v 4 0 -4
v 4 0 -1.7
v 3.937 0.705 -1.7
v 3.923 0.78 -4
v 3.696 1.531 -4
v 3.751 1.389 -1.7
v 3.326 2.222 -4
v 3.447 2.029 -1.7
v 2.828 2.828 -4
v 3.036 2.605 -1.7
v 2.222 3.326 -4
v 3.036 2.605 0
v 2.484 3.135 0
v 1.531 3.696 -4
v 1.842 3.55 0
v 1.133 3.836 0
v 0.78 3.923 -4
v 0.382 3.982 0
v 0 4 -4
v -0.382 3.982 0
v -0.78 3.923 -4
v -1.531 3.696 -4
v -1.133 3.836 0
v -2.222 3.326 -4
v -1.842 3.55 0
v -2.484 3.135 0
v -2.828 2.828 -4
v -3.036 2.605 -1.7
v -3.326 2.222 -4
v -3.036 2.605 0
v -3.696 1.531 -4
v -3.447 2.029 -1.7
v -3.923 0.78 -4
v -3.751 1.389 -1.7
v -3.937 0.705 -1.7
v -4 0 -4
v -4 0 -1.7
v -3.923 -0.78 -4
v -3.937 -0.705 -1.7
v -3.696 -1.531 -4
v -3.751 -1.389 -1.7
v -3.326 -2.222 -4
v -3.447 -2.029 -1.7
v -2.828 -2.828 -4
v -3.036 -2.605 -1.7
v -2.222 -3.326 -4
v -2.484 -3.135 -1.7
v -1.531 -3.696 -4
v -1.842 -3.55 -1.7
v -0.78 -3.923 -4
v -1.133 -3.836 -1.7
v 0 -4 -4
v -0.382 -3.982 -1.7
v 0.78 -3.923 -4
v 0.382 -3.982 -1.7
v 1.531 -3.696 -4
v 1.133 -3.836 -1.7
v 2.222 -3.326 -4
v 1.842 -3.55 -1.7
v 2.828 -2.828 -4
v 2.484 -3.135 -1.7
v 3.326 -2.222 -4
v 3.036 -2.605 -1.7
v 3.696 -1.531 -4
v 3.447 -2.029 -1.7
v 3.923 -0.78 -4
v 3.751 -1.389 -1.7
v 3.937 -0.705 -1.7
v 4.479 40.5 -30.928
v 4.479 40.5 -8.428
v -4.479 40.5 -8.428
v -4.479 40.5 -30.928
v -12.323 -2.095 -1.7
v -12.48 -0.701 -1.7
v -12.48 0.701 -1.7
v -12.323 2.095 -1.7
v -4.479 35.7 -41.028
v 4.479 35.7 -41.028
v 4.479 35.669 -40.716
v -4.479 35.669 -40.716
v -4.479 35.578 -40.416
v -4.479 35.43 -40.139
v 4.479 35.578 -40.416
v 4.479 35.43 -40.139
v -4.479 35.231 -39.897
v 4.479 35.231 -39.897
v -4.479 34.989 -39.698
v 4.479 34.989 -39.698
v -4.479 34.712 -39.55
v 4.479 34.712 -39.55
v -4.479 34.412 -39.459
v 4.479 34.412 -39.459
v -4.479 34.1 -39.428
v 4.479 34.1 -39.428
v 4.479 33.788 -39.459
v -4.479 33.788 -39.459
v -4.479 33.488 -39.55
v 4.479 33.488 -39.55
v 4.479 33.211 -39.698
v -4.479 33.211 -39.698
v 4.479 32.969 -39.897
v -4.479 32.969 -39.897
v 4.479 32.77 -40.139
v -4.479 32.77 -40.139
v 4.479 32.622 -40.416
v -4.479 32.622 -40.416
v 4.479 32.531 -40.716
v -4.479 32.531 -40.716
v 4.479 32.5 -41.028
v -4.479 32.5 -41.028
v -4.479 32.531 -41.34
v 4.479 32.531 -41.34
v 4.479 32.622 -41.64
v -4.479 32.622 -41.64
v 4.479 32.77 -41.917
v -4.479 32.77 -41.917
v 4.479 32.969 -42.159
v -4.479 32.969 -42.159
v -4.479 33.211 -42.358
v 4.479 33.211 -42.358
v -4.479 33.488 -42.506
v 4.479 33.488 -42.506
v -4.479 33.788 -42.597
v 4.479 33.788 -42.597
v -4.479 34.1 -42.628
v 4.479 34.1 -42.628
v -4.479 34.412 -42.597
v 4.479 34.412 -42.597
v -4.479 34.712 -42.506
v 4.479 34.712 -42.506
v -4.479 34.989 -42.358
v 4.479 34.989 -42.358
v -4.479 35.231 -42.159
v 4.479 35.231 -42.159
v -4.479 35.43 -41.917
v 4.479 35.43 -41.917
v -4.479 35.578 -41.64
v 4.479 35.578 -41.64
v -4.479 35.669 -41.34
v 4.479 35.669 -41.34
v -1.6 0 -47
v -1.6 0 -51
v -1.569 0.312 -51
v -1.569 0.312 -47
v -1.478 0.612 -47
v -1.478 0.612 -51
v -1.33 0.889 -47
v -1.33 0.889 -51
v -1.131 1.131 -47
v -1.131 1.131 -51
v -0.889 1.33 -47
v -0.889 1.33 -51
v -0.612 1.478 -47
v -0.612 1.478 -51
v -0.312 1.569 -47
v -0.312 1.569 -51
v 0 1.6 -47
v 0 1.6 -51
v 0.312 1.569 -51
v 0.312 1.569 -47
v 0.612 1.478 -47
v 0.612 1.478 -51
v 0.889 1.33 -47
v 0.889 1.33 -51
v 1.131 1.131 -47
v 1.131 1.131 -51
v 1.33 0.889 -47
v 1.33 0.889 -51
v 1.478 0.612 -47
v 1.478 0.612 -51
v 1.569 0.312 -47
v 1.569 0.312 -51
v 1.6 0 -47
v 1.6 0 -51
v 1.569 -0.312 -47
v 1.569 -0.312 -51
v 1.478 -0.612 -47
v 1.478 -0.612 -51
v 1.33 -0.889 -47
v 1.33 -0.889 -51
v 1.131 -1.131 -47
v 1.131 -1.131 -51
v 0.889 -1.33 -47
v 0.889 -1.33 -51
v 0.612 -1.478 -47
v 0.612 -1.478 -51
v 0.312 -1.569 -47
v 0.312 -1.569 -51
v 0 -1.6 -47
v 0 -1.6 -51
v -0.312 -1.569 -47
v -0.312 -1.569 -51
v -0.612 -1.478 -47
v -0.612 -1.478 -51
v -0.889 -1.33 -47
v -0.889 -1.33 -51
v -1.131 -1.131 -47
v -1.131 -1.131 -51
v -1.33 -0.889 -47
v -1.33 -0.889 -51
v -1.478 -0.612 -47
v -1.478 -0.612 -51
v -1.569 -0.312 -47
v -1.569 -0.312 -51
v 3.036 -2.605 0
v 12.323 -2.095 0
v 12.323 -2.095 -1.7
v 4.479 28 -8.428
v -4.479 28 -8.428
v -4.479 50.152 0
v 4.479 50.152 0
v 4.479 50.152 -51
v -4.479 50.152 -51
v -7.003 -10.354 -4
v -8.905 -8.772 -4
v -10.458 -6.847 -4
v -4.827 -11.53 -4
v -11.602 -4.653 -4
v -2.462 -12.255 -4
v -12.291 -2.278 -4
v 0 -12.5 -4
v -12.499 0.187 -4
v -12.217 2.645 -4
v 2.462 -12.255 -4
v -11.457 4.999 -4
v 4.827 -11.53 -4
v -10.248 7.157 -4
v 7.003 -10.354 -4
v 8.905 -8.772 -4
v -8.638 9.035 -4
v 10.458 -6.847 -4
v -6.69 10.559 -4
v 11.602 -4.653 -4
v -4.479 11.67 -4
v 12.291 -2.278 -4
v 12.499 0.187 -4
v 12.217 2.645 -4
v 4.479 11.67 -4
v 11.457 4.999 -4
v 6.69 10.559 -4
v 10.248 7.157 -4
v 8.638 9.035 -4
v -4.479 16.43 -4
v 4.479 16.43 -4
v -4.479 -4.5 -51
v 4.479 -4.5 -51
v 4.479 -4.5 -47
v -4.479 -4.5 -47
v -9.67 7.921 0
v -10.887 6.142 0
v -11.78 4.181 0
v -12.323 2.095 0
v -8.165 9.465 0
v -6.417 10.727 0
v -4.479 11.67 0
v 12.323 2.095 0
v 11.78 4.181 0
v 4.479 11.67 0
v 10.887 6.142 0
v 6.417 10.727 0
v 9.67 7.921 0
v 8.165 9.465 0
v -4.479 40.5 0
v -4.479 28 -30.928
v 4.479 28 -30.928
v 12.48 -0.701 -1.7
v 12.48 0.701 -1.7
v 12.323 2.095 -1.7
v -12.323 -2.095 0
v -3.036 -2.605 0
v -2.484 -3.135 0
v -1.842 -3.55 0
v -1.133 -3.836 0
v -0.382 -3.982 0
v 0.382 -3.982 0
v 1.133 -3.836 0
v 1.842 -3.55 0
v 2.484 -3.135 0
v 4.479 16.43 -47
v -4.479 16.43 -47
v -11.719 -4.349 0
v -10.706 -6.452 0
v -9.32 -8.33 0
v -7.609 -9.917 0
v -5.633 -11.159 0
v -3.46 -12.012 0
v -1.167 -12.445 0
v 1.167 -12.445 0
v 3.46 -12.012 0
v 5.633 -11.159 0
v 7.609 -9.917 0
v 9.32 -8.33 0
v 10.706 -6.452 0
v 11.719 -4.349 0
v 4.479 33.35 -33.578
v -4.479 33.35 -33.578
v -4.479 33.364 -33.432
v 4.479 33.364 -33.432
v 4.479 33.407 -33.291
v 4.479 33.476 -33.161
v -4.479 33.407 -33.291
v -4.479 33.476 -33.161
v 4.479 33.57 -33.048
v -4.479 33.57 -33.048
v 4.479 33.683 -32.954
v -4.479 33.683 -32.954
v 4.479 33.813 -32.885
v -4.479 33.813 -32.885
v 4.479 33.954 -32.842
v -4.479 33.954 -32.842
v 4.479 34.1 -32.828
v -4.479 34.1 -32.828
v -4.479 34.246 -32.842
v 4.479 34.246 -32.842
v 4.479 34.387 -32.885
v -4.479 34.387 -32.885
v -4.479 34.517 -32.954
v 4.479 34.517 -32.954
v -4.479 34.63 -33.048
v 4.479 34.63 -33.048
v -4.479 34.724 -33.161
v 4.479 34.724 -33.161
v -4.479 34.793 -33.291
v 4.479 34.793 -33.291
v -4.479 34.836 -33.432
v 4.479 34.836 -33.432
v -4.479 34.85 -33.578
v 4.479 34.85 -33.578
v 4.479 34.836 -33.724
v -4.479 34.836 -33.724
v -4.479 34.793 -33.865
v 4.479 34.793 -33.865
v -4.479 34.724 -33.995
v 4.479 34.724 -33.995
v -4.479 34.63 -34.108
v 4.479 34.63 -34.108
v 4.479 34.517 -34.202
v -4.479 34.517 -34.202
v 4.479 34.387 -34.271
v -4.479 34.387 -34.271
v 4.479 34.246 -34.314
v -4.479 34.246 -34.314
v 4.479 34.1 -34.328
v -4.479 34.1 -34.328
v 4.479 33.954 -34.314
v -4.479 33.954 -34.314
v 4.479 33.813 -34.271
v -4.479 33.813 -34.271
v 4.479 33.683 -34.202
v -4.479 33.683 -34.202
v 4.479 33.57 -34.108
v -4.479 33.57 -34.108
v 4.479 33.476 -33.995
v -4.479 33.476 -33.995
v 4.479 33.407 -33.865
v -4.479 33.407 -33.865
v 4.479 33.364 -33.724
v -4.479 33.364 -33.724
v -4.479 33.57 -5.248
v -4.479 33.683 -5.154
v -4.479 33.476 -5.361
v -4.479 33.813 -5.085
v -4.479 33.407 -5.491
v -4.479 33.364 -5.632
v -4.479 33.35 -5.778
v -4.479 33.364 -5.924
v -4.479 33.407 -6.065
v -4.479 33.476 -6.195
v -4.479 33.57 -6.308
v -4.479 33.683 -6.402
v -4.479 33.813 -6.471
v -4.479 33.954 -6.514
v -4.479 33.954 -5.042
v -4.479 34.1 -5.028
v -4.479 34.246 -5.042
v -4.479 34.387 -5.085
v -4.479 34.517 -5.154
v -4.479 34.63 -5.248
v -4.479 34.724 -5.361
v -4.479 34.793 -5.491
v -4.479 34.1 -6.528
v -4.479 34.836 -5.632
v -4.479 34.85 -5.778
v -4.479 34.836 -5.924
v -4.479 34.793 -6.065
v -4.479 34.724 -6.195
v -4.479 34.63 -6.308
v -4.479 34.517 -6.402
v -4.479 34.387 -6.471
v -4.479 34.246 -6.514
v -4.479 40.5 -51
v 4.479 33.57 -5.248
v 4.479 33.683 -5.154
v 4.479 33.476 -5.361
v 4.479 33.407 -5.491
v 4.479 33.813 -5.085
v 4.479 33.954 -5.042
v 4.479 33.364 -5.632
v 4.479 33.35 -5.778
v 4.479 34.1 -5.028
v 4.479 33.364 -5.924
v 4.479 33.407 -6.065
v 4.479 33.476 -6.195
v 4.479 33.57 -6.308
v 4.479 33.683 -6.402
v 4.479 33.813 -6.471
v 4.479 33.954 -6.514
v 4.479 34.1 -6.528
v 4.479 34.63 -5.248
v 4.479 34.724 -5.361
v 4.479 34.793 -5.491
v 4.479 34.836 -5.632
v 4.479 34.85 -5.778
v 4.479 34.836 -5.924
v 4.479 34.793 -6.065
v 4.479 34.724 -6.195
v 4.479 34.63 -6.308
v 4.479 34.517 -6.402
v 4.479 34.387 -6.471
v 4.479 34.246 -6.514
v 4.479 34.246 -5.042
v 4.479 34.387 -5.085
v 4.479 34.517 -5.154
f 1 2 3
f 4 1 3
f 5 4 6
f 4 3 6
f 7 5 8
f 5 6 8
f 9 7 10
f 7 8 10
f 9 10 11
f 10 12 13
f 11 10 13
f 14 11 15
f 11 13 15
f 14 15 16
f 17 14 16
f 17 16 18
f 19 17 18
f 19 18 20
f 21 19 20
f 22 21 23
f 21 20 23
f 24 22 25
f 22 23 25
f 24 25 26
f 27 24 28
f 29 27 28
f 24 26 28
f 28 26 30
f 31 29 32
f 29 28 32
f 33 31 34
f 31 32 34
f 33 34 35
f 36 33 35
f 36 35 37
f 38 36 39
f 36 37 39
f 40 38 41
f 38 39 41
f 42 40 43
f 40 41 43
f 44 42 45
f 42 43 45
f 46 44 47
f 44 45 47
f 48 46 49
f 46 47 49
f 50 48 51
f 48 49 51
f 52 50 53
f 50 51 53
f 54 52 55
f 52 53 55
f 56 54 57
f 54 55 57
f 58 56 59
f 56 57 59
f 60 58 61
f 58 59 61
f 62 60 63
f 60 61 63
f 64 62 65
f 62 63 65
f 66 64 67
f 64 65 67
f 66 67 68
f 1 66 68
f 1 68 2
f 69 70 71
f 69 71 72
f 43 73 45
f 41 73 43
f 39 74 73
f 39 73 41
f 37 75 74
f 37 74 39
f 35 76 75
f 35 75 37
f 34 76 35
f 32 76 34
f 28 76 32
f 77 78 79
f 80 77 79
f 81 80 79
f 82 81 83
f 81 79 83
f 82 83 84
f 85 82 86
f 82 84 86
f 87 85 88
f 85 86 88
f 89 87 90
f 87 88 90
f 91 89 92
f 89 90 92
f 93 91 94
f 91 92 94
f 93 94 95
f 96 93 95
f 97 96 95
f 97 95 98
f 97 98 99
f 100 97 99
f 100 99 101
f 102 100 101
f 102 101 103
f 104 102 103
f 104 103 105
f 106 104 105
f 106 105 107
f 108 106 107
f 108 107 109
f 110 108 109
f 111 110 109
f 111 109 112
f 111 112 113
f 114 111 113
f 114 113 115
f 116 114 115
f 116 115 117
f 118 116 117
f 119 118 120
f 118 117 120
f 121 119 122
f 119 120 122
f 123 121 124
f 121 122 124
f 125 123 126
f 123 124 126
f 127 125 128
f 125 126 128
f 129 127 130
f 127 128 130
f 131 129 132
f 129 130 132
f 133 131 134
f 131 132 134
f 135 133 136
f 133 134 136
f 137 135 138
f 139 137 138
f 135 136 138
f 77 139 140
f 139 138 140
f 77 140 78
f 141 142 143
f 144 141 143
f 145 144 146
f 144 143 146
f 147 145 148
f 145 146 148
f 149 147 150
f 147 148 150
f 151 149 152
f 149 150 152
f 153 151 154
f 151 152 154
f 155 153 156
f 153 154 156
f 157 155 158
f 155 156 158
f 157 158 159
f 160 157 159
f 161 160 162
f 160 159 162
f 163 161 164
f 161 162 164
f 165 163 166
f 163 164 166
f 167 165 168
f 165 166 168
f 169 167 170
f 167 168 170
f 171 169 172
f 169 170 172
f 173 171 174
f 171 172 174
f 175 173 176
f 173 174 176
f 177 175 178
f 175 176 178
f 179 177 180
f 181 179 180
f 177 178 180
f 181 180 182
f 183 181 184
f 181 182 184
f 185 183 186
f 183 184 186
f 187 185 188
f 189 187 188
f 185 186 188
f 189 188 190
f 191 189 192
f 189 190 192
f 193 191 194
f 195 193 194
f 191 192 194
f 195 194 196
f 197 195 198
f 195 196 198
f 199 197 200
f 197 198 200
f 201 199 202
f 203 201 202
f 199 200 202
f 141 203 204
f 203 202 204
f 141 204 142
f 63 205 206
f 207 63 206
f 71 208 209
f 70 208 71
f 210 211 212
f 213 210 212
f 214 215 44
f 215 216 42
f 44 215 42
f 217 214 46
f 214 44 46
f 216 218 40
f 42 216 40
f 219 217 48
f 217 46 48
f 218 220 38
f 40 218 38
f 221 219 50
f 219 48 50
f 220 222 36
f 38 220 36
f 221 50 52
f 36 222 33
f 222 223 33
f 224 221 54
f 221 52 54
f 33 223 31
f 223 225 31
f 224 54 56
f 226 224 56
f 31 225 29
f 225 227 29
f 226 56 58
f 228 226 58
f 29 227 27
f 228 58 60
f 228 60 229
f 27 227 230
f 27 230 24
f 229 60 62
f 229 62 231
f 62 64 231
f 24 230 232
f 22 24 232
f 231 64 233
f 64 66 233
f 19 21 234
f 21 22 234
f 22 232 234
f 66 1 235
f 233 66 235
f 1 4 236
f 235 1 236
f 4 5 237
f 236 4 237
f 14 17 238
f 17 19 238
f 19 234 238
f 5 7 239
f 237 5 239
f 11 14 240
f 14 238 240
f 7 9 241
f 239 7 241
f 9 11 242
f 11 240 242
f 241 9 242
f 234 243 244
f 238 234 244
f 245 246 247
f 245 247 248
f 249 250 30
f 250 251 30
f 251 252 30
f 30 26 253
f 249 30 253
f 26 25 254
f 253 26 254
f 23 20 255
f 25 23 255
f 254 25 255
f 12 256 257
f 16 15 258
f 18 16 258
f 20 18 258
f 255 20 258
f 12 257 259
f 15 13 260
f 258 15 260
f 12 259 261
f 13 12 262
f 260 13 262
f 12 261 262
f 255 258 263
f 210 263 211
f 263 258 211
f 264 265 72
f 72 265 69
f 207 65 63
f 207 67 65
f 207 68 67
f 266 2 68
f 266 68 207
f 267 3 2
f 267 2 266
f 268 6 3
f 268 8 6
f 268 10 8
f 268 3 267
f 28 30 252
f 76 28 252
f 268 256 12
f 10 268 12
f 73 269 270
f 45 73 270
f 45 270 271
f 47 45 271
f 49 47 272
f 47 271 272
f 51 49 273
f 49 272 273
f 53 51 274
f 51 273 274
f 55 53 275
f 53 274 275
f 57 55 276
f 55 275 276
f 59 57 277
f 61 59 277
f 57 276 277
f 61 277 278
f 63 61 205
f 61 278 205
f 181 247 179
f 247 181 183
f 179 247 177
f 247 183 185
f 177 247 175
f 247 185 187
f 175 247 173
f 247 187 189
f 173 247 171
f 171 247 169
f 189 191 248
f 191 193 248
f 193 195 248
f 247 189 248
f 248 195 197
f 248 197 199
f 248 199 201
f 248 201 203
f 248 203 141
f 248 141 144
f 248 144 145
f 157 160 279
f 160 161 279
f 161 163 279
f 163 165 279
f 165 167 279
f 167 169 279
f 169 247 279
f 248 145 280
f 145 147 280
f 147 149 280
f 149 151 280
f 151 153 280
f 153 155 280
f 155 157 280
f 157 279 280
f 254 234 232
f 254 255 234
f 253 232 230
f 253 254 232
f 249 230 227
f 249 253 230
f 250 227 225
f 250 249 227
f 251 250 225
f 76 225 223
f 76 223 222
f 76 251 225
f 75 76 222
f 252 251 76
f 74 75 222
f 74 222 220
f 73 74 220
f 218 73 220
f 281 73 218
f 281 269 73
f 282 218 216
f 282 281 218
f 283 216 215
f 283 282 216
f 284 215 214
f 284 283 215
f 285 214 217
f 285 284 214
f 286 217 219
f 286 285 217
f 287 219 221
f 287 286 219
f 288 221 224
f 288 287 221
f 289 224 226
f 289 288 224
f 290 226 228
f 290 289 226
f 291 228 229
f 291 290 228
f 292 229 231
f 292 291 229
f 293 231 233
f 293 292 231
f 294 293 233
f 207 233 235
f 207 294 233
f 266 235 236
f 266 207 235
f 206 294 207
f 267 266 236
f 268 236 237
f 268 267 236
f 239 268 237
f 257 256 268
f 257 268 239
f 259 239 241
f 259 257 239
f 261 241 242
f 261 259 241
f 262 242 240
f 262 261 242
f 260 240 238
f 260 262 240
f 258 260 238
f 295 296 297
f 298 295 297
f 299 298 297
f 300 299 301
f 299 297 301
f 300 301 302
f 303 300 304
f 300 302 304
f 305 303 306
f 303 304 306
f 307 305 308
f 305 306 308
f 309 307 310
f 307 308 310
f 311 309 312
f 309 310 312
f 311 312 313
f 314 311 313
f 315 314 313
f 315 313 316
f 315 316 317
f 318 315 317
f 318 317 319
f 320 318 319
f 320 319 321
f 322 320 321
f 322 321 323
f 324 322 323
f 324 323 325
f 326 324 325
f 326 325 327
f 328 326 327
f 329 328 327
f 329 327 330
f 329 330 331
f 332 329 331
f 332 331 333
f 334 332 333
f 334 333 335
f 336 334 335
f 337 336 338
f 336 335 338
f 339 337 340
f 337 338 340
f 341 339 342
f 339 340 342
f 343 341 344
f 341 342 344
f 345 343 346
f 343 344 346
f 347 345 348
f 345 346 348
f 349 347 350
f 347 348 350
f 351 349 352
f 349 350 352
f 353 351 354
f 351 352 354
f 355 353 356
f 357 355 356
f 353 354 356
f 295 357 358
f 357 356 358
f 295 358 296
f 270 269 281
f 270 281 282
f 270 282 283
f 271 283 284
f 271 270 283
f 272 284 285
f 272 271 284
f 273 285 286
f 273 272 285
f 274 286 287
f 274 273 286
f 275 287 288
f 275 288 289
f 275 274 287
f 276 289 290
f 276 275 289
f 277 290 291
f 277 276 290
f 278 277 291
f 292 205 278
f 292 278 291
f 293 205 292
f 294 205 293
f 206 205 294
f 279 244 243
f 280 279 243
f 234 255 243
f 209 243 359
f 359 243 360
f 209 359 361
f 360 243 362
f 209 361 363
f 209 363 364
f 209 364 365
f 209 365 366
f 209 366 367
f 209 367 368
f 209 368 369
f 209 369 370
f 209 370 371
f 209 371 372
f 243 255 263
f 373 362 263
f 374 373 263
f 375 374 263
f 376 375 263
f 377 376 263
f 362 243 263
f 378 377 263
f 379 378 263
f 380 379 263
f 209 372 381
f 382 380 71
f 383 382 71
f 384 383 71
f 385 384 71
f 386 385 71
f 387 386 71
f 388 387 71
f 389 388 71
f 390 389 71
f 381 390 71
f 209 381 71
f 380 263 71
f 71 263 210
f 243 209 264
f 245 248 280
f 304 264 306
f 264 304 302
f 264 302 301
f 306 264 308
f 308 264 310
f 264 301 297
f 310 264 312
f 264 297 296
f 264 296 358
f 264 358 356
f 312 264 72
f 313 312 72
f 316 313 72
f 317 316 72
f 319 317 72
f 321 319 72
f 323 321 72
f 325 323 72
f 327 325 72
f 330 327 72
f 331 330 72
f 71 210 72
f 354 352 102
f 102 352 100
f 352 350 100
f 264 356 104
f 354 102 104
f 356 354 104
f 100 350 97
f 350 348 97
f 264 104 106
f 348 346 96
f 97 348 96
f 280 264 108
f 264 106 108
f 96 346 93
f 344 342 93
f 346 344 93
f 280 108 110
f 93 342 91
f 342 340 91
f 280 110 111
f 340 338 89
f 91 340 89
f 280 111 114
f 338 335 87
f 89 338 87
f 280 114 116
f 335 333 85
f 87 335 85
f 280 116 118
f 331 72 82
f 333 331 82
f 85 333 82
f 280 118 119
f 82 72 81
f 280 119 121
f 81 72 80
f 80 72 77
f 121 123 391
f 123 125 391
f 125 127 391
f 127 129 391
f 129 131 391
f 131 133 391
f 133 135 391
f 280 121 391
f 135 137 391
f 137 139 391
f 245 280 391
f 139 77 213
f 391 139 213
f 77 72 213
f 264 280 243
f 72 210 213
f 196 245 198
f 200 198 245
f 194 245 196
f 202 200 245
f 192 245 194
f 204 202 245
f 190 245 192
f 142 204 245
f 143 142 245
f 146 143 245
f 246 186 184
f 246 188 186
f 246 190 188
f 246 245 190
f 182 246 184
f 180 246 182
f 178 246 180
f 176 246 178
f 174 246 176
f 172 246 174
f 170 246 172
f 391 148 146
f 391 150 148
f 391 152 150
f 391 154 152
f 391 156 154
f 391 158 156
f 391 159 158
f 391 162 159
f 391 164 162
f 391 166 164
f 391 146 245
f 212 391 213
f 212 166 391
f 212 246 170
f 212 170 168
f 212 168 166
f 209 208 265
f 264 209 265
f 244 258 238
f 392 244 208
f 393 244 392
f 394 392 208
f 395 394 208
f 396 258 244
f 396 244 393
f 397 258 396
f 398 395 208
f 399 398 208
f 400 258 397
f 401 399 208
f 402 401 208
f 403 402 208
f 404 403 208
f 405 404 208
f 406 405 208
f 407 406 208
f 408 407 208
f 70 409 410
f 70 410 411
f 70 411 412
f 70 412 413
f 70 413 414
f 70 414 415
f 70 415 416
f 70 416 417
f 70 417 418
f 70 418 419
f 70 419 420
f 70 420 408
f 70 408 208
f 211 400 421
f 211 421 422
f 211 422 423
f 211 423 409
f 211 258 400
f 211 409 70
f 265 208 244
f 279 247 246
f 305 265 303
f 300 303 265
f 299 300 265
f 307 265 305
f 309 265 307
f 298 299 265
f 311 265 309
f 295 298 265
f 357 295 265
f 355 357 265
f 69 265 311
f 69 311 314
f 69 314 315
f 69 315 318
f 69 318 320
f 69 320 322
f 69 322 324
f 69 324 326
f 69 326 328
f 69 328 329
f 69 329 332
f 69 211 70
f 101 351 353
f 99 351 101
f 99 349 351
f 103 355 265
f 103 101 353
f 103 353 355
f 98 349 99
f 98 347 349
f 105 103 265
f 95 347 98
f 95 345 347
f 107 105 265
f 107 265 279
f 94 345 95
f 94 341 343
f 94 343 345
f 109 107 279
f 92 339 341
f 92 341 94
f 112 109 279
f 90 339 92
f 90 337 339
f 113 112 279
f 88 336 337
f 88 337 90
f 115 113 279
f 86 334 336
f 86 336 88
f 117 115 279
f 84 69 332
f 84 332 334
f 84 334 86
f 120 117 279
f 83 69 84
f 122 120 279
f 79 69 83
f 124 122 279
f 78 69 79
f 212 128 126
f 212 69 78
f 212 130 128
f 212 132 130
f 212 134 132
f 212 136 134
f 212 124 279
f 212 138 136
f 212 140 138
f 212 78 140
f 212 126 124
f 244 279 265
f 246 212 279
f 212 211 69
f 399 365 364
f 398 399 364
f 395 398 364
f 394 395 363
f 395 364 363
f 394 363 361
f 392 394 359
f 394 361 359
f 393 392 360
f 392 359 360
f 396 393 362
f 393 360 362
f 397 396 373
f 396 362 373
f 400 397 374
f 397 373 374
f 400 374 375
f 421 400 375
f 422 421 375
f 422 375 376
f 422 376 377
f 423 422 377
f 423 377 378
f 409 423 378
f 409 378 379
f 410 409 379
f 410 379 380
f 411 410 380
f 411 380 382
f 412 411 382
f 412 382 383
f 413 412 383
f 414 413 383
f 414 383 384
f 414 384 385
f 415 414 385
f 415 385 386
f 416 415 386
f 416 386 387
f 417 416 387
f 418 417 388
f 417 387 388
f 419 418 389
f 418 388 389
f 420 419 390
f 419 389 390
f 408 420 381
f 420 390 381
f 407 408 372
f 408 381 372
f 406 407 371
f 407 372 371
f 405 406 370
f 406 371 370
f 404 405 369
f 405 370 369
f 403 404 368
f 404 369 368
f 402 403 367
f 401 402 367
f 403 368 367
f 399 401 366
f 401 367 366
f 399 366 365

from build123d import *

# Parameters (mm, degrees)
SKETCH1_R           = 12.5
SKETCH1_R_2         = 4
BOSS_EXTRUDE1_DEPTH = 4
CUT_EXTRUDE1_DEPTH  = 1.7
SKETCH3_W           = 8.958376624
SKETCH3_H           = 30
BOSS_EXTRUDE2_DEPTH = 4
SKETCH4_W           = 8.958376624
SKETCH4_H           = 24.069748571
BOSS_EXTRUDE3_DEPTH = 47
SKETCH5_W           = 8.958376624
SKETCH5_H           = 45
SKETCH5_R           = 1.6
BOSS_EXTRUDE4_DEPTH = 4
SKETCH6_W           = 22.5
SKETCH6_H           = 12.5
CUT_EXTRUDE2_DEPTH  = 68.301878397
SKETCH7_R           = 1.6
CUT_EXTRUDE3_DEPTH  = 68.301878397
SKETCH8_R           = 0.75
CUT_EXTRUDE4_DEPTH  = 68.301878397
SKETCH9_W           = 51
SKETCH9_H           = 9.652107549
BOSS_EXTRUDE5_DEPTH = 8.95837662


with BuildPart() as part:
    # Sketch1 → Boss-Extrude1 (new body)
    with BuildSketch(Plane.XY):
        Circle(SKETCH1_R)
        Circle(SKETCH1_R_2, mode=Mode.SUBTRACT)
    extrude(amount=-BOSS_EXTRUDE1_DEPTH)

    # Sketch2 → Cut-Extrude1 (cut)
    with BuildSketch(Plane.XY):
        with BuildLine():
            Line((14.05, 2), (3.035592941, 2.604836943))
            ThreePointArc((3.035592941, 2.604836943), (0, 4), (-3.035592941, 2.604836943))
            Line((-3.035592941, 2.604836943), (-14.05, 2))
            ThreePointArc((-14.05, 2), (-16.05, 0), (-14.05, -2))
            Line((-14.05, -2), (-3.035592941, -2.604836943))
            ThreePointArc((-3.035592941, -2.604836943), (0, -4), (3.035592941, -2.604836943))
            Line((3.035592941, -2.604836943), (14.05, -2))
            ThreePointArc((14.05, -2), (16.05, 0), (14.05, 2))
        make_face()
    extrude(amount=-CUT_EXTRUDE1_DEPTH, mode=Mode.SUBTRACT)

    # Sketch3 → Boss-Extrude2 (add)
    with BuildSketch(Plane.XY):
        with Locations((0, 25.5)):
            Rectangle(SKETCH3_W, SKETCH3_H)
    extrude(amount=-BOSS_EXTRUDE2_DEPTH)

    # Sketch4 → Boss-Extrude3 (add)
    with BuildSketch(Plane(origin=(0, 0, -4), x_dir=(-1, 0, 0), z_dir=(0, 0, -1))):
        with Locations((0, 28.465125715)):
            Rectangle(SKETCH4_W, SKETCH4_H)
    extrude(amount=BOSS_EXTRUDE3_DEPTH)

    # Sketch5 → Boss-Extrude4 (add)
    with BuildSketch(Plane(origin=(0, 0, -51), x_dir=(-1, 0, 0), z_dir=(0, 0, -1))):
        with Locations((0, 18)):
            Rectangle(SKETCH5_W, SKETCH5_H)
        Circle(SKETCH5_R, mode=Mode.SUBTRACT)
    extrude(amount=-BOSS_EXTRUDE4_DEPTH)

    # Sketch6 → Cut-Extrude2 (cut, through all)
    with BuildSketch(Plane(origin=(4.479188312, 0, 0), x_dir=(0, 0, -1), z_dir=(1, 0, 0))):
        with Locations((19.677937554, 34.25)):
            Rectangle(SKETCH6_W, SKETCH6_H)
    extrude(amount=-CUT_EXTRUDE2_DEPTH, mode=Mode.SUBTRACT)

    # Sketch7 → Cut-Extrude3 (cut, through all)
    with BuildSketch(Plane(origin=(4.479188312, 0, 0), x_dir=(0, 0, -1), z_dir=(1, 0, 0))):
        with Locations((41.027937554, 34.1)):
            Circle(SKETCH7_R)
    extrude(amount=-CUT_EXTRUDE3_DEPTH, mode=Mode.SUBTRACT)

    # Sketch8 → Cut-Extrude4 (cut, through all)
    with BuildSketch(Plane.ZY.offset(4.479188312)):
        with Locations((-33.577937554, 34.1)):
            Circle(SKETCH8_R)
        with Locations((-5.777937554, 34.1)):
            Circle(SKETCH8_R)
    extrude(amount=-CUT_EXTRUDE4_DEPTH, mode=Mode.SUBTRACT)

    # Sketch9 → Boss-Extrude5 (add)
    with BuildSketch(Plane(origin=(4.479188312, 0, 0), x_dir=(0, 0, -1), z_dir=(1, 0, 0))):
        with Locations((25.5, 45.326053774)):
            Rectangle(SKETCH9_W, SKETCH9_H)
    extrude(amount=-BOSS_EXTRUDE5_DEPTH)


solid = part.part
